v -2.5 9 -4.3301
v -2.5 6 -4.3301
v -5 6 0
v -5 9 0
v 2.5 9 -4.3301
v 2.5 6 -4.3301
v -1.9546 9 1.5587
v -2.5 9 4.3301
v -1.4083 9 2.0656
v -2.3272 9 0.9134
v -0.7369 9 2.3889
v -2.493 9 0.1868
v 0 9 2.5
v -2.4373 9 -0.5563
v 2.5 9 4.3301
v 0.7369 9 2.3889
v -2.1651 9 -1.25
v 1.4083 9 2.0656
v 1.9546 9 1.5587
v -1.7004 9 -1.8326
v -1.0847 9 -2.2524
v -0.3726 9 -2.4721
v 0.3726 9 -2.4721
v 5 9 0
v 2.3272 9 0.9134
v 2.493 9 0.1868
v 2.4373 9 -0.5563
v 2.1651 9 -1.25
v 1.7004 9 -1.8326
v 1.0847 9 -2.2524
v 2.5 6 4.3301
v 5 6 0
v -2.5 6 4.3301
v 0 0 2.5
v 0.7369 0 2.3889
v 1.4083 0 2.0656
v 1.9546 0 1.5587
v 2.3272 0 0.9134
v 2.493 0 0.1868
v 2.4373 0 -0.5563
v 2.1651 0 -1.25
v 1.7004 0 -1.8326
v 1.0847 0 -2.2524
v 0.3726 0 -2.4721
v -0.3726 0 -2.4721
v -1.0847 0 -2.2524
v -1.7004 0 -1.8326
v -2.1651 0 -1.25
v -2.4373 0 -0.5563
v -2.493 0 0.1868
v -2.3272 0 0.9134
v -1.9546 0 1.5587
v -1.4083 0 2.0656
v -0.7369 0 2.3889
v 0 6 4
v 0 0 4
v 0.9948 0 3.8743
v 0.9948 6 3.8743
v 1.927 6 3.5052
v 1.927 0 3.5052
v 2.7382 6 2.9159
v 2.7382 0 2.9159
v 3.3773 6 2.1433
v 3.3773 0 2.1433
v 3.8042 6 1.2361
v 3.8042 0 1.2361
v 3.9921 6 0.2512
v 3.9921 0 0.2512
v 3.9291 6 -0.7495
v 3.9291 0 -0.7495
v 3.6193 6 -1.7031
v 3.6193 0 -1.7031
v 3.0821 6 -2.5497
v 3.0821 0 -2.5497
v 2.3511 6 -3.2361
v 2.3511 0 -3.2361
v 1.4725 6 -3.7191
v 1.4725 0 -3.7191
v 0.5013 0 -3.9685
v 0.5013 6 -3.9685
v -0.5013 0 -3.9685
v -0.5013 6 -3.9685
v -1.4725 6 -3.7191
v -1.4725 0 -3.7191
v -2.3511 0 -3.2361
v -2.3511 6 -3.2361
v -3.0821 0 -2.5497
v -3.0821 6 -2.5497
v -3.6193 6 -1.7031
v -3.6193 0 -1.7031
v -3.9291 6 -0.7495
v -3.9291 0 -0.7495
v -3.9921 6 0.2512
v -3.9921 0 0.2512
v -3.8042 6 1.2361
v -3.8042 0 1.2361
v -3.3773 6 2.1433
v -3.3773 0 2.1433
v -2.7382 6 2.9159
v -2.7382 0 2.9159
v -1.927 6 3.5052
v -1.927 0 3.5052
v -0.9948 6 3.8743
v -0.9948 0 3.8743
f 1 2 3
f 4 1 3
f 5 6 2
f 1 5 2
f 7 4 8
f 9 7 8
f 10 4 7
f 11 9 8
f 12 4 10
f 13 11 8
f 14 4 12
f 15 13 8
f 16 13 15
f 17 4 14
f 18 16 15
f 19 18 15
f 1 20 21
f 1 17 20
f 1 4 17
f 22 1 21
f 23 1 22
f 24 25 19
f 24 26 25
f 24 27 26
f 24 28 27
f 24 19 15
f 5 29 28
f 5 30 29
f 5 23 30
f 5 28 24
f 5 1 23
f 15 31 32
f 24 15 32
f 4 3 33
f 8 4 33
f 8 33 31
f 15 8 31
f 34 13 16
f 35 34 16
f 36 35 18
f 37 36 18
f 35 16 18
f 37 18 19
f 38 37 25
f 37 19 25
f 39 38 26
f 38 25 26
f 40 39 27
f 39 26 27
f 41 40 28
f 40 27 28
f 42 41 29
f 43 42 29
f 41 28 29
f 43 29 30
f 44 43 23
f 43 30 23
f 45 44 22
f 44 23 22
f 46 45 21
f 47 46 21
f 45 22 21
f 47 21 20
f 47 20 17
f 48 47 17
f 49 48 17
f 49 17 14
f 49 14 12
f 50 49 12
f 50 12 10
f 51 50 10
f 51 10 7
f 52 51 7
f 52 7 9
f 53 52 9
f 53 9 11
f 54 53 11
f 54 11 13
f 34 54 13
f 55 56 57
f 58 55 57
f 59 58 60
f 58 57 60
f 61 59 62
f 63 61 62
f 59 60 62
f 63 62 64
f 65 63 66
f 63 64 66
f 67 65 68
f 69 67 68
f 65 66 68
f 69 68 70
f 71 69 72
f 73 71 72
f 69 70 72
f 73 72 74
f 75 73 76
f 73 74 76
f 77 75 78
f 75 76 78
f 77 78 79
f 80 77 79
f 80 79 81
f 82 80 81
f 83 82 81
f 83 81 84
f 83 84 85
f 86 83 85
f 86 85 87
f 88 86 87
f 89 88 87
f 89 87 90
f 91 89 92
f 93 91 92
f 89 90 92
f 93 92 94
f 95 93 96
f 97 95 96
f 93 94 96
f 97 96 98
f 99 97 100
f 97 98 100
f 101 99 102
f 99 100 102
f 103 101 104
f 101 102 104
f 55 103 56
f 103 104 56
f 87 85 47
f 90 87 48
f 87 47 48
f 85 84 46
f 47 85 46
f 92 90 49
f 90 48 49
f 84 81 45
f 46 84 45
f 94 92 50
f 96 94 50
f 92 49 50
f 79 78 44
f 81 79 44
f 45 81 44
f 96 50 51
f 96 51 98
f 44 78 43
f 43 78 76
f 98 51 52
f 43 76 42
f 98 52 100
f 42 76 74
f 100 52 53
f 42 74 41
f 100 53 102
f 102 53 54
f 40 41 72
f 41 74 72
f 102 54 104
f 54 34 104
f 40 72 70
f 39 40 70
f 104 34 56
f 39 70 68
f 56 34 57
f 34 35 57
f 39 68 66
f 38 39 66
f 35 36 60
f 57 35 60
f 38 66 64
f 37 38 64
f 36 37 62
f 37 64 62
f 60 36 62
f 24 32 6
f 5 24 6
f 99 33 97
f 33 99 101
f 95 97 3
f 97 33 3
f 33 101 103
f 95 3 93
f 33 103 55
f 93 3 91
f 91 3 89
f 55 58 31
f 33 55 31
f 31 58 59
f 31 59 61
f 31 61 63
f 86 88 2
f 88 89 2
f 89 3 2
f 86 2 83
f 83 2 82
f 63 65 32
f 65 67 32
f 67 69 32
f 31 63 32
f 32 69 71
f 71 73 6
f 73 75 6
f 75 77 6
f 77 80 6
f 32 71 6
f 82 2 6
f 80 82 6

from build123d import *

# Parameters (mm, degrees)
SKETCH1_R           = 4
BOSS_EXTRUDE1_DEPTH = 6
BOSS_EXTRUDE2_DEPTH = 3
SKETCH3_R           = 2.5
CUT_EXTRUDE1_DEPTH  = 12.169153952


with BuildPart() as part:
    # Sketch1 → Boss-Extrude1 (new body)
    with BuildSketch(Plane(origin=(0, 0, 0), x_dir=(1, 0, 0), z_dir=(0, 1, 0))):
        with Locations(Location((0, 0, 0), (0, 0, 270))):
            Circle(SKETCH1_R)
    extrude(amount=BOSS_EXTRUDE1_DEPTH)

    # Sketch2 → Boss-Extrude2 (add)
    with BuildSketch(Plane(origin=(0, 6, 0), x_dir=(1, 0, 0), z_dir=(0, 1, 0))):
        Polygon((2.5, -4.330127019), (5, 0), (2.5, 4.330127019), (-2.5, 4.330127019), (-5, 0), (-2.5, -4.330127019), align=None)
    extrude(amount=BOSS_EXTRUDE2_DEPTH)

    # Sketch3 → Cut-Extrude1 (cut, through all)
    with BuildSketch(Plane(origin=(0, 9, 0), x_dir=(1, 0, 0), z_dir=(0, 1, 0))):
        with Locations(Location((0, 0, 0), (0, 0, 270))):
            Circle(SKETCH3_R)
    extrude(amount=-CUT_EXTRUDE1_DEPTH, mode=Mode.SUBTRACT)


solid = part.part
